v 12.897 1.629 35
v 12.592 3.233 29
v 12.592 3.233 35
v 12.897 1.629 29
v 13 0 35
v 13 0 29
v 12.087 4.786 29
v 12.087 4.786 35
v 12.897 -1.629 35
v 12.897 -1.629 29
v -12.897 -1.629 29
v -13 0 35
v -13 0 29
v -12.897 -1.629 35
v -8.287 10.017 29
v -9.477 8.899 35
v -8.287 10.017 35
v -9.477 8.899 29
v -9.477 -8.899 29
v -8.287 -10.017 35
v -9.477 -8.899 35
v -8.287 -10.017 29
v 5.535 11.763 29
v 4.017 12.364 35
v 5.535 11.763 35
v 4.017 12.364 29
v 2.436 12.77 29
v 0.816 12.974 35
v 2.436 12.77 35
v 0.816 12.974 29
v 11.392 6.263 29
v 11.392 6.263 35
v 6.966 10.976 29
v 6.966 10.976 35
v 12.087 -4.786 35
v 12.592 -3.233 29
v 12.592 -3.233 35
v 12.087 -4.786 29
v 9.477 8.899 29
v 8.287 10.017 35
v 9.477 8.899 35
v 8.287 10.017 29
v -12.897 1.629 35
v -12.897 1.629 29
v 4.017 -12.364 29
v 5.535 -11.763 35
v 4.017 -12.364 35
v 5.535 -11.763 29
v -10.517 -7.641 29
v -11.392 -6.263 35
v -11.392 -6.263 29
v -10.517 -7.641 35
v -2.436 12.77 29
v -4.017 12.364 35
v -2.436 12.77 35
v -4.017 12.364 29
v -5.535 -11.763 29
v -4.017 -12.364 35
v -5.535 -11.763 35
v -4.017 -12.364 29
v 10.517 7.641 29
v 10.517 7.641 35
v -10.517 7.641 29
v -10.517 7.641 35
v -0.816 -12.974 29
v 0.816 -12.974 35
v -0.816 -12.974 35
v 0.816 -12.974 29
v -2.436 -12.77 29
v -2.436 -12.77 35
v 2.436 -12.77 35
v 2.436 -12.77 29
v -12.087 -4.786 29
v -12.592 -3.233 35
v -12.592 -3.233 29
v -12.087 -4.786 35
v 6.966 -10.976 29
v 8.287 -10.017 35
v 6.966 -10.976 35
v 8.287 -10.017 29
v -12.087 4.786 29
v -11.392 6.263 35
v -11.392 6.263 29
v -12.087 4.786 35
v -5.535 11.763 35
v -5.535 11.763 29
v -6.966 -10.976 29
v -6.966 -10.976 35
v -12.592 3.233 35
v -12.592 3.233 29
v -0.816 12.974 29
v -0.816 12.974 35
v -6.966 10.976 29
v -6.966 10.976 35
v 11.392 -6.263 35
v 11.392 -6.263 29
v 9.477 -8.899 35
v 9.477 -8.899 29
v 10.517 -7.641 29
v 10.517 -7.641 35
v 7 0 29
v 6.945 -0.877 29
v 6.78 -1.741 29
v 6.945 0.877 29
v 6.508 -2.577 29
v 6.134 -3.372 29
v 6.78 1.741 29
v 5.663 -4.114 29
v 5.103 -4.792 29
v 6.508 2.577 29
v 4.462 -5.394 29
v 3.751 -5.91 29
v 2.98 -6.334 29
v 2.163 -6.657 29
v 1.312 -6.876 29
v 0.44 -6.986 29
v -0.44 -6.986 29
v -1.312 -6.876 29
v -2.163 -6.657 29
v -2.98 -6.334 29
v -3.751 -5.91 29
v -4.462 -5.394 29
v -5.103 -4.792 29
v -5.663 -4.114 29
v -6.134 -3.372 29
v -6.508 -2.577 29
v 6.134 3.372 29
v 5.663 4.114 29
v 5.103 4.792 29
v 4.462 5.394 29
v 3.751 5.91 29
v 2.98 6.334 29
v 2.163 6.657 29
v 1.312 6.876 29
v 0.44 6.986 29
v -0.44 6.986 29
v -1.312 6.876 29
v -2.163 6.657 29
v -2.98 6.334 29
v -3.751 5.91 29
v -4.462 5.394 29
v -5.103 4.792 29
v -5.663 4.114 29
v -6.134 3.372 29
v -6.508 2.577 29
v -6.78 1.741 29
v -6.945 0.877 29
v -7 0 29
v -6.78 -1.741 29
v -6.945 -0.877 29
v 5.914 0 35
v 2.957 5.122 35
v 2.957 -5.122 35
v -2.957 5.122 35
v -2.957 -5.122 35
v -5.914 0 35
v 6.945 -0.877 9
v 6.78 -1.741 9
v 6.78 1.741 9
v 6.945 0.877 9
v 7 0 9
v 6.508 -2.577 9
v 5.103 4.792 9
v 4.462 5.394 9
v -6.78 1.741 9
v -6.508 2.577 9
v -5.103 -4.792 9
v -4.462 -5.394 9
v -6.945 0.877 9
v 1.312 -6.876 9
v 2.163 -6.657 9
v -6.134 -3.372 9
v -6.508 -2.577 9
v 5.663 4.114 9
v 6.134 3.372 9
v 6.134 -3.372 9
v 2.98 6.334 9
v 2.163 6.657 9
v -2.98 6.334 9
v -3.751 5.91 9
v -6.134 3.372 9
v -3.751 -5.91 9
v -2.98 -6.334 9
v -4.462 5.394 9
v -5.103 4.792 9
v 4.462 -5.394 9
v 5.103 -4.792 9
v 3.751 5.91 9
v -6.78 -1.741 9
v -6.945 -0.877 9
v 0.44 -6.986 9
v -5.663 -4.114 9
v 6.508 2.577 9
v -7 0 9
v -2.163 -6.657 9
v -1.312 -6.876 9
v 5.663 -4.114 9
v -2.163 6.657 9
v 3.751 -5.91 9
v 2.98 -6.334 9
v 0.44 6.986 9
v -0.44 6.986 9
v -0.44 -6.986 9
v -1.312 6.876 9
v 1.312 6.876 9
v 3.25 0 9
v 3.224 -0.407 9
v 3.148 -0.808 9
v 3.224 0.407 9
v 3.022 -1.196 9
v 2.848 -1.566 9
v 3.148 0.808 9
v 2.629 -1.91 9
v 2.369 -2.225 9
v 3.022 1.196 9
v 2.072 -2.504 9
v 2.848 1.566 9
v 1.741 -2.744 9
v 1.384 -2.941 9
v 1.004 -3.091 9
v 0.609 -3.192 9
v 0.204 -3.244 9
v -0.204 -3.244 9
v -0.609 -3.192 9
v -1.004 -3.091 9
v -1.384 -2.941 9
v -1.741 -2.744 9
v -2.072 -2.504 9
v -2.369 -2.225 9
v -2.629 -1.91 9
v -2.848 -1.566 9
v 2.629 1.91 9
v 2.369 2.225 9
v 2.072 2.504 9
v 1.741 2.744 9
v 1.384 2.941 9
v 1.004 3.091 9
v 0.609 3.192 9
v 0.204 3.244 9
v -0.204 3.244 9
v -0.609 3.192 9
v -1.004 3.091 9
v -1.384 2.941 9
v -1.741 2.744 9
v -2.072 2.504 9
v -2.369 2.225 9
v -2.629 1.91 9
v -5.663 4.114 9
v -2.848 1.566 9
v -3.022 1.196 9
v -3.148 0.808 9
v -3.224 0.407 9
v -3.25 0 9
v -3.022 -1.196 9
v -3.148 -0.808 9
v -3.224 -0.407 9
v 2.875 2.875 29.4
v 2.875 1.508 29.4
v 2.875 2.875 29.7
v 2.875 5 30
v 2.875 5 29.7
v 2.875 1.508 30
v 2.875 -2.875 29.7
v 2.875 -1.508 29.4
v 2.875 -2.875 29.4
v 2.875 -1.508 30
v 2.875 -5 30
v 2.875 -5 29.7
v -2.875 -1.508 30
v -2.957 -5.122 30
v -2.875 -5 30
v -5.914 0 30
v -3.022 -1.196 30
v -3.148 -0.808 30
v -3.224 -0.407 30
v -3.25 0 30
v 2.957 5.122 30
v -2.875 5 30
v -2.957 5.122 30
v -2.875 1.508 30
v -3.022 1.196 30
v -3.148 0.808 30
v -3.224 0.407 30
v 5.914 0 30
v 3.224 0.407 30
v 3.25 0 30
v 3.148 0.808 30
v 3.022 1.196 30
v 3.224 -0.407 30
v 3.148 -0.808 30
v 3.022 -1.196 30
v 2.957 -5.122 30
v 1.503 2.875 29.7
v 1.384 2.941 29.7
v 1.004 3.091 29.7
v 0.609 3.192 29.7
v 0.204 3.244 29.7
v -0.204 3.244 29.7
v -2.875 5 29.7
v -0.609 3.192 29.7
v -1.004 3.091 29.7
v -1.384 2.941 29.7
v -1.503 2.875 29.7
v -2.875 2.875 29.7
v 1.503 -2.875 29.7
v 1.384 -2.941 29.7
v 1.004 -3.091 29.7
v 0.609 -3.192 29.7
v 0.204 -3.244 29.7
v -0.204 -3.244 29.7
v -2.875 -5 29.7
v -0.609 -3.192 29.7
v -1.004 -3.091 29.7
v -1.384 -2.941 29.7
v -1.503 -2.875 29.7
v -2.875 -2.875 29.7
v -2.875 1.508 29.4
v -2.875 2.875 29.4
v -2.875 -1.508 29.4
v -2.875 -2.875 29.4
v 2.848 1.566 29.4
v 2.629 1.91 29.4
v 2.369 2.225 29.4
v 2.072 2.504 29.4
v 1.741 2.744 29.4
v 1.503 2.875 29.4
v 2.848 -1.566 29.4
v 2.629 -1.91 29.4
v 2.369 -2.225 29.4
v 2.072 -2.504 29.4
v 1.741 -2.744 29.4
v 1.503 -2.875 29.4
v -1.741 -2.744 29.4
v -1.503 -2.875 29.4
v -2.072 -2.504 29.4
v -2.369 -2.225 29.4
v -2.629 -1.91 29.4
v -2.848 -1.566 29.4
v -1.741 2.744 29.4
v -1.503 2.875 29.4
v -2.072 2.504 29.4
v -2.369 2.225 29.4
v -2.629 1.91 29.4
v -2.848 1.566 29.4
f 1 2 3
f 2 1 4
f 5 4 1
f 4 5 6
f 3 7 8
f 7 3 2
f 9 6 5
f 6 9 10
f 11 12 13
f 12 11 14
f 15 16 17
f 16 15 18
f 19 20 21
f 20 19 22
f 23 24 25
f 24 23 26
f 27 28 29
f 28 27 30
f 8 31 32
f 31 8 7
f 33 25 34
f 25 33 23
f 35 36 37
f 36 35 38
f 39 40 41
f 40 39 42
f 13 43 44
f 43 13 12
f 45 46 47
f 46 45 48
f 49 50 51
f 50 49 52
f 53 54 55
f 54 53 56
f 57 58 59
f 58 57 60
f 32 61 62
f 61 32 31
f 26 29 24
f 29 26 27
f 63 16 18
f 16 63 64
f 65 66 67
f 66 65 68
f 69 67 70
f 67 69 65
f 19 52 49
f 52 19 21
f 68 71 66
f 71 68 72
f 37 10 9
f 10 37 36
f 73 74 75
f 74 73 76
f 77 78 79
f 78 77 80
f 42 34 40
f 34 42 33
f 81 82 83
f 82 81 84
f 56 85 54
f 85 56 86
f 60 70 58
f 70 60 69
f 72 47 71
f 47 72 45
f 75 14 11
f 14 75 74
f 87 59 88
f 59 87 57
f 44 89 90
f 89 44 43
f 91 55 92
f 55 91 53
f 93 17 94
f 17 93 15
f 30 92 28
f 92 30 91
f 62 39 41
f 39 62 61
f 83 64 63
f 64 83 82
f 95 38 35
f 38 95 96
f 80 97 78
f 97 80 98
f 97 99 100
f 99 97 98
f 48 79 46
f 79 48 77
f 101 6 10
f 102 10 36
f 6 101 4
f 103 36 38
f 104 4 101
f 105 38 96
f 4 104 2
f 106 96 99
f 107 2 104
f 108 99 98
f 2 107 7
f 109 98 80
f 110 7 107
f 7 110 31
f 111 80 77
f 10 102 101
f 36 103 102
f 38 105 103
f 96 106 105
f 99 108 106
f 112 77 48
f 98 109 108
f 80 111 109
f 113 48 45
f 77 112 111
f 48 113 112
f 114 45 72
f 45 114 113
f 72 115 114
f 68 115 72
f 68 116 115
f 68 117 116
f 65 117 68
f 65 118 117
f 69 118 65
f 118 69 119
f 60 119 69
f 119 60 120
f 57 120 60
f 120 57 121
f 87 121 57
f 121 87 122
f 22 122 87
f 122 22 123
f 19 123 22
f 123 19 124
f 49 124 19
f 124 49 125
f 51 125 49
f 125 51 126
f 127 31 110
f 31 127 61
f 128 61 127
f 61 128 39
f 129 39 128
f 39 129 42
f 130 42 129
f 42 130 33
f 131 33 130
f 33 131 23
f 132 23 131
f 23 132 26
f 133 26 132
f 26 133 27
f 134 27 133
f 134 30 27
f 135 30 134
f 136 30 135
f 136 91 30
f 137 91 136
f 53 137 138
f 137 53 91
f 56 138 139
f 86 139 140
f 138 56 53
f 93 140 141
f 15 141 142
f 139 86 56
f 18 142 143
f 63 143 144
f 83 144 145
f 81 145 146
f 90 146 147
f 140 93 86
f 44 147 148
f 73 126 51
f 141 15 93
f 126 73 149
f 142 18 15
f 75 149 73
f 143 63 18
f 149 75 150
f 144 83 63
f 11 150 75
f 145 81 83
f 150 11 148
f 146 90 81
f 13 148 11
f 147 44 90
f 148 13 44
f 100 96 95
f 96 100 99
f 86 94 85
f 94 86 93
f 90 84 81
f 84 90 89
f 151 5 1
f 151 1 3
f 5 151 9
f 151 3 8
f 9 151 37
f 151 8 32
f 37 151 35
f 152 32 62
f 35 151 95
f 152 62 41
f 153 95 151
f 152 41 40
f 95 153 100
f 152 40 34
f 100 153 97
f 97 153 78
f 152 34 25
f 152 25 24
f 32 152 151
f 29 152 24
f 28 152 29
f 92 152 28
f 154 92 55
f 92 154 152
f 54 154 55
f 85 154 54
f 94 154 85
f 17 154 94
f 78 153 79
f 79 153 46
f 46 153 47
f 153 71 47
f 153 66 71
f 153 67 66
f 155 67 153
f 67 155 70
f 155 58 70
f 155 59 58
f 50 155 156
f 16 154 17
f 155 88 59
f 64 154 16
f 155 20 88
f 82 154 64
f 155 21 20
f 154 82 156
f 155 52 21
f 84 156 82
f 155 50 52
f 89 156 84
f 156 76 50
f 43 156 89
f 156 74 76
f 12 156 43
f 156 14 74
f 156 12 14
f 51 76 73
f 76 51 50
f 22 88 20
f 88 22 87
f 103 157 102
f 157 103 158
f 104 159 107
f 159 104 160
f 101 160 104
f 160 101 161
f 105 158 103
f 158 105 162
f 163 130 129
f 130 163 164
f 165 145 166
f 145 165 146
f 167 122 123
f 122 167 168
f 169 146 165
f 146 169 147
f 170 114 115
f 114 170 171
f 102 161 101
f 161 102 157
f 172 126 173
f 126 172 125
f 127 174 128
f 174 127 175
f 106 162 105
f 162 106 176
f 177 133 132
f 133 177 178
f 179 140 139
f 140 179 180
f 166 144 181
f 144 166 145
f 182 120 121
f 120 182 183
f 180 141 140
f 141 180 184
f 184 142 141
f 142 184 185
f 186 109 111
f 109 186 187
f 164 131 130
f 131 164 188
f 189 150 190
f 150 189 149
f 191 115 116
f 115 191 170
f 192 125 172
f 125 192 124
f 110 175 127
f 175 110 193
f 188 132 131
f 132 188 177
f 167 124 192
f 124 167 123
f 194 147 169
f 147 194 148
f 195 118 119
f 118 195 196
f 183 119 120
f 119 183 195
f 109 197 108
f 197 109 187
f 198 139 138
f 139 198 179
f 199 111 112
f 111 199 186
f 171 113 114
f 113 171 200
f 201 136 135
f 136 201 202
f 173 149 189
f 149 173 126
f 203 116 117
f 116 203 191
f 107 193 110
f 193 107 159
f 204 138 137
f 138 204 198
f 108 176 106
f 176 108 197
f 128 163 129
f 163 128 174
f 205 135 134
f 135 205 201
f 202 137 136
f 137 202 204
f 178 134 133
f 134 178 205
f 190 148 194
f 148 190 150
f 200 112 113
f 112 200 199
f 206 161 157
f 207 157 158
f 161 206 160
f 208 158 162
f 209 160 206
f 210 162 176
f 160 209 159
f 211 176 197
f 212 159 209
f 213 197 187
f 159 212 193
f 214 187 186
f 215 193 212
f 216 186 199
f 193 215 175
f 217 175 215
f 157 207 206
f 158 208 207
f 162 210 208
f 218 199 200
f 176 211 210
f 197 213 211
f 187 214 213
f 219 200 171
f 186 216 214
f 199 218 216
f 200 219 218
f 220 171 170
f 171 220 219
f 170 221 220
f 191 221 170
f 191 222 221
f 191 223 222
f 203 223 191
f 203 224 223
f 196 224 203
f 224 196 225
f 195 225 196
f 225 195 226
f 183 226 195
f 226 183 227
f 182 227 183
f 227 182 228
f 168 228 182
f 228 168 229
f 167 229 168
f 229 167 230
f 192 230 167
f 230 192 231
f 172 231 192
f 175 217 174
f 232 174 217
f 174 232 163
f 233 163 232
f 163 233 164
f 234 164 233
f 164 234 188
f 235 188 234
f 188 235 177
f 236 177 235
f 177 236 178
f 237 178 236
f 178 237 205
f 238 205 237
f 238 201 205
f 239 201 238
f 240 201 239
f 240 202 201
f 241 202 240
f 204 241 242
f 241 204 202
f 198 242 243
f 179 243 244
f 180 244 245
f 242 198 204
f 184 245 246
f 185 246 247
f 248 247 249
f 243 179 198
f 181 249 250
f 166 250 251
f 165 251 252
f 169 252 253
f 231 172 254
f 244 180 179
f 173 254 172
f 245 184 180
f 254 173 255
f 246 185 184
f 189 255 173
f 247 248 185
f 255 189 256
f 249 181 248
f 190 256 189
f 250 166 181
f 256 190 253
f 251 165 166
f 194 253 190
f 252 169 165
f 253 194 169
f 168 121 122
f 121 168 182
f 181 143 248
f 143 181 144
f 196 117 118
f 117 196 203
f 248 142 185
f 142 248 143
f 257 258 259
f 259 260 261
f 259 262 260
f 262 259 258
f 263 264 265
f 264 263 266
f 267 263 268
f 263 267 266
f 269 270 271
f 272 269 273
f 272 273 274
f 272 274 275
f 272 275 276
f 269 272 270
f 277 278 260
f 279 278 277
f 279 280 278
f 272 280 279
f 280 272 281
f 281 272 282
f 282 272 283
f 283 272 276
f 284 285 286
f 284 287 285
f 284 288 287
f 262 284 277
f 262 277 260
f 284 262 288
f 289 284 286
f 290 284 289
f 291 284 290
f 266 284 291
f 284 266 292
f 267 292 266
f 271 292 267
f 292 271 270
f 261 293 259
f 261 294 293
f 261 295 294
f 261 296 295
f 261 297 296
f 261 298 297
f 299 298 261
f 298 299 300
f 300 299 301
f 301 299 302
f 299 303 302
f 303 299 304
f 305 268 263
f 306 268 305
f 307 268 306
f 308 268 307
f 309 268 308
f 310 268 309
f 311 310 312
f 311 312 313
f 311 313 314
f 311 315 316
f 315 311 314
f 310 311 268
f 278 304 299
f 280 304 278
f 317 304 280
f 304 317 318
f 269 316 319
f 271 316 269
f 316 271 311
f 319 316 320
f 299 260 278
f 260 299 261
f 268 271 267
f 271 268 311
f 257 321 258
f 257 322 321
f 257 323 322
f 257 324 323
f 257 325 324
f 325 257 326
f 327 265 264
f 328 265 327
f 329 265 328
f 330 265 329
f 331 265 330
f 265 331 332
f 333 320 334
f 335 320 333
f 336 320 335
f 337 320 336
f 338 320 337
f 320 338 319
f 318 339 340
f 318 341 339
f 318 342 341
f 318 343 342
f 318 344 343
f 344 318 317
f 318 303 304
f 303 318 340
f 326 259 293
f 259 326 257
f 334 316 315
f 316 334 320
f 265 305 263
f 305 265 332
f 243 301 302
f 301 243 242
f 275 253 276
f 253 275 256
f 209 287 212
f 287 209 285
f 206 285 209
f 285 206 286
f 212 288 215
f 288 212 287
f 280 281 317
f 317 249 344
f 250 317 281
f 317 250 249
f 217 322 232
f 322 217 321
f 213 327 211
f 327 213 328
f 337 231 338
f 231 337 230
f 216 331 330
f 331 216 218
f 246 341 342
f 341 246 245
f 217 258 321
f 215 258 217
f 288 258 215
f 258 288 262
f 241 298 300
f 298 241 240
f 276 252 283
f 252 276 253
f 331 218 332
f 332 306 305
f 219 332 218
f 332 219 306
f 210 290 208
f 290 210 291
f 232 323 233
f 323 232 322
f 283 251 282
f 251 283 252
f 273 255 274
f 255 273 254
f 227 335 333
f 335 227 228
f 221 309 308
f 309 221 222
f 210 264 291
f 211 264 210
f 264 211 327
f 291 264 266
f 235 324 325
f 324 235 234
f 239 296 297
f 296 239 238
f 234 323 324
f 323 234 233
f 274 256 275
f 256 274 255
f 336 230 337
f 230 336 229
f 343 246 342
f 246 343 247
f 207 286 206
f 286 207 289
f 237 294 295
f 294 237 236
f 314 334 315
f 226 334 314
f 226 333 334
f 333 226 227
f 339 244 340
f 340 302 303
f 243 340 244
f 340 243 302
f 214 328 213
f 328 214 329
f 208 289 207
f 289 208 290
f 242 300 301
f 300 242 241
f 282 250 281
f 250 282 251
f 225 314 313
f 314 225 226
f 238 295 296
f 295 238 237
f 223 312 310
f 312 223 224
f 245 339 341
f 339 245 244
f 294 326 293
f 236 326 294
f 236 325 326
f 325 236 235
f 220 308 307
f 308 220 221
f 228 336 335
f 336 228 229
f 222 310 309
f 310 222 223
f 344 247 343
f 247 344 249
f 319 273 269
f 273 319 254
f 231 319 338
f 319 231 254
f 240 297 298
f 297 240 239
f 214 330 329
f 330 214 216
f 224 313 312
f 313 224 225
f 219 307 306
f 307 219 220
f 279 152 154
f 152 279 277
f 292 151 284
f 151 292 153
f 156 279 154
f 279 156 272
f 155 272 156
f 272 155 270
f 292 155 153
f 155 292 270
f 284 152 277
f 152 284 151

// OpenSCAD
$fn = 50;


difference() {
	union() {
		translate(v = [0, 0, 29.0000000000]) {
			cylinder(h = 6, r = 13.0000000000);
		}
		translate(v = [0, 0, 9.0000000000]) {
			cylinder(h = 26, r = 7.0000000000);
		}
	}
	union() {
		translate(v = [0, 0, 35]) {
			rotate(a = [0, 0, 0]) {
				difference() {
					union() {
						#translate(v = [-2.8750000000, -5.0000000000, -5.3000000000]) {
							cube(size = [5.7500000000, 10, 0.3000000000]);
						}
						#translate(v = [-2.8750000000, -2.8750000000, -5.6000000000]) {
							cube(size = [5.7500000000, 5.7500000000, 0.3000000000]);
						}
						#translate(v = [-2.8750000000, -5.0000000000, 0]) {
							cube(size = [5.7500000000, 10, 0.3000000000]);
						}
						#translate(v = [-2.8750000000, -2.8750000000, 0.3000000000]) {
							cube(size = [5.7500000000, 5.7500000000, 0.3000000000]);
						}
						#translate(v = [0, 0, -100.0000000000]) {
							cylinder(h = 200, r = 3.2500000000);
						}
						translate(v = [0, 0, -5]) {
							#linear_extrude(height = 5) {
								polygon(points = [[5.9142500000, 0.0000000000], [2.9571250000, 5.1218907443], [-2.9571250000, 5.1218907443], [-5.9142500000, 0.0000000000], [-2.9571250000, -5.1218907443], [2.9571250000, -5.1218907443]]);
							}
						}
						#translate(v = [-2.8750000000, -5.0000000000, -5.3000000000]) {
							cube(size = [5.7500000000, 10, 0.3000000000]);
						}
						#translate(v = [-2.8750000000, -2.8750000000, -5.6000000000]) {
							cube(size = [5.7500000000, 5.7500000000, 0.3000000000]);
						}
						#translate(v = [-2.8750000000, -5.0000000000, 0]) {
							cube(size = [5.7500000000, 10, 0.3000000000]);
						}
						#translate(v = [-2.8750000000, -2.8750000000, 0.3000000000]) {
							cube(size = [5.7500000000, 5.7500000000, 0.3000000000]);
						}
						#translate(v = [0, 0, -100.0000000000]) {
							cylinder(h = 200, r = 3.2500000000);
						}
						#translate(v = [-2.8750000000, -5.0000000000, -5.3000000000]) {
							cube(size = [5.7500000000, 10, 0.3000000000]);
						}
						#translate(v = [-2.8750000000, -2.8750000000, -5.6000000000]) {
							cube(size = [5.7500000000, 5.7500000000, 0.3000000000]);
						}
						#translate(v = [-2.8750000000, -5.0000000000, 0]) {
							cube(size = [5.7500000000, 10, 0.3000000000]);
						}
						#translate(v = [-2.8750000000, -2.8750000000, 0.3000000000]) {
							cube(size = [5.7500000000, 5.7500000000, 0.3000000000]);
						}
						#translate(v = [0, 0, -100.0000000000]) {
							cylinder(h = 200, r = 3.2500000000);
						}
					}
					union();
				}
			}
		}
		#translate(v = [0, 0, -100.0000000000]) {
			cylinder(h = 200, r = 3.2500000000);
		}
	}
}
